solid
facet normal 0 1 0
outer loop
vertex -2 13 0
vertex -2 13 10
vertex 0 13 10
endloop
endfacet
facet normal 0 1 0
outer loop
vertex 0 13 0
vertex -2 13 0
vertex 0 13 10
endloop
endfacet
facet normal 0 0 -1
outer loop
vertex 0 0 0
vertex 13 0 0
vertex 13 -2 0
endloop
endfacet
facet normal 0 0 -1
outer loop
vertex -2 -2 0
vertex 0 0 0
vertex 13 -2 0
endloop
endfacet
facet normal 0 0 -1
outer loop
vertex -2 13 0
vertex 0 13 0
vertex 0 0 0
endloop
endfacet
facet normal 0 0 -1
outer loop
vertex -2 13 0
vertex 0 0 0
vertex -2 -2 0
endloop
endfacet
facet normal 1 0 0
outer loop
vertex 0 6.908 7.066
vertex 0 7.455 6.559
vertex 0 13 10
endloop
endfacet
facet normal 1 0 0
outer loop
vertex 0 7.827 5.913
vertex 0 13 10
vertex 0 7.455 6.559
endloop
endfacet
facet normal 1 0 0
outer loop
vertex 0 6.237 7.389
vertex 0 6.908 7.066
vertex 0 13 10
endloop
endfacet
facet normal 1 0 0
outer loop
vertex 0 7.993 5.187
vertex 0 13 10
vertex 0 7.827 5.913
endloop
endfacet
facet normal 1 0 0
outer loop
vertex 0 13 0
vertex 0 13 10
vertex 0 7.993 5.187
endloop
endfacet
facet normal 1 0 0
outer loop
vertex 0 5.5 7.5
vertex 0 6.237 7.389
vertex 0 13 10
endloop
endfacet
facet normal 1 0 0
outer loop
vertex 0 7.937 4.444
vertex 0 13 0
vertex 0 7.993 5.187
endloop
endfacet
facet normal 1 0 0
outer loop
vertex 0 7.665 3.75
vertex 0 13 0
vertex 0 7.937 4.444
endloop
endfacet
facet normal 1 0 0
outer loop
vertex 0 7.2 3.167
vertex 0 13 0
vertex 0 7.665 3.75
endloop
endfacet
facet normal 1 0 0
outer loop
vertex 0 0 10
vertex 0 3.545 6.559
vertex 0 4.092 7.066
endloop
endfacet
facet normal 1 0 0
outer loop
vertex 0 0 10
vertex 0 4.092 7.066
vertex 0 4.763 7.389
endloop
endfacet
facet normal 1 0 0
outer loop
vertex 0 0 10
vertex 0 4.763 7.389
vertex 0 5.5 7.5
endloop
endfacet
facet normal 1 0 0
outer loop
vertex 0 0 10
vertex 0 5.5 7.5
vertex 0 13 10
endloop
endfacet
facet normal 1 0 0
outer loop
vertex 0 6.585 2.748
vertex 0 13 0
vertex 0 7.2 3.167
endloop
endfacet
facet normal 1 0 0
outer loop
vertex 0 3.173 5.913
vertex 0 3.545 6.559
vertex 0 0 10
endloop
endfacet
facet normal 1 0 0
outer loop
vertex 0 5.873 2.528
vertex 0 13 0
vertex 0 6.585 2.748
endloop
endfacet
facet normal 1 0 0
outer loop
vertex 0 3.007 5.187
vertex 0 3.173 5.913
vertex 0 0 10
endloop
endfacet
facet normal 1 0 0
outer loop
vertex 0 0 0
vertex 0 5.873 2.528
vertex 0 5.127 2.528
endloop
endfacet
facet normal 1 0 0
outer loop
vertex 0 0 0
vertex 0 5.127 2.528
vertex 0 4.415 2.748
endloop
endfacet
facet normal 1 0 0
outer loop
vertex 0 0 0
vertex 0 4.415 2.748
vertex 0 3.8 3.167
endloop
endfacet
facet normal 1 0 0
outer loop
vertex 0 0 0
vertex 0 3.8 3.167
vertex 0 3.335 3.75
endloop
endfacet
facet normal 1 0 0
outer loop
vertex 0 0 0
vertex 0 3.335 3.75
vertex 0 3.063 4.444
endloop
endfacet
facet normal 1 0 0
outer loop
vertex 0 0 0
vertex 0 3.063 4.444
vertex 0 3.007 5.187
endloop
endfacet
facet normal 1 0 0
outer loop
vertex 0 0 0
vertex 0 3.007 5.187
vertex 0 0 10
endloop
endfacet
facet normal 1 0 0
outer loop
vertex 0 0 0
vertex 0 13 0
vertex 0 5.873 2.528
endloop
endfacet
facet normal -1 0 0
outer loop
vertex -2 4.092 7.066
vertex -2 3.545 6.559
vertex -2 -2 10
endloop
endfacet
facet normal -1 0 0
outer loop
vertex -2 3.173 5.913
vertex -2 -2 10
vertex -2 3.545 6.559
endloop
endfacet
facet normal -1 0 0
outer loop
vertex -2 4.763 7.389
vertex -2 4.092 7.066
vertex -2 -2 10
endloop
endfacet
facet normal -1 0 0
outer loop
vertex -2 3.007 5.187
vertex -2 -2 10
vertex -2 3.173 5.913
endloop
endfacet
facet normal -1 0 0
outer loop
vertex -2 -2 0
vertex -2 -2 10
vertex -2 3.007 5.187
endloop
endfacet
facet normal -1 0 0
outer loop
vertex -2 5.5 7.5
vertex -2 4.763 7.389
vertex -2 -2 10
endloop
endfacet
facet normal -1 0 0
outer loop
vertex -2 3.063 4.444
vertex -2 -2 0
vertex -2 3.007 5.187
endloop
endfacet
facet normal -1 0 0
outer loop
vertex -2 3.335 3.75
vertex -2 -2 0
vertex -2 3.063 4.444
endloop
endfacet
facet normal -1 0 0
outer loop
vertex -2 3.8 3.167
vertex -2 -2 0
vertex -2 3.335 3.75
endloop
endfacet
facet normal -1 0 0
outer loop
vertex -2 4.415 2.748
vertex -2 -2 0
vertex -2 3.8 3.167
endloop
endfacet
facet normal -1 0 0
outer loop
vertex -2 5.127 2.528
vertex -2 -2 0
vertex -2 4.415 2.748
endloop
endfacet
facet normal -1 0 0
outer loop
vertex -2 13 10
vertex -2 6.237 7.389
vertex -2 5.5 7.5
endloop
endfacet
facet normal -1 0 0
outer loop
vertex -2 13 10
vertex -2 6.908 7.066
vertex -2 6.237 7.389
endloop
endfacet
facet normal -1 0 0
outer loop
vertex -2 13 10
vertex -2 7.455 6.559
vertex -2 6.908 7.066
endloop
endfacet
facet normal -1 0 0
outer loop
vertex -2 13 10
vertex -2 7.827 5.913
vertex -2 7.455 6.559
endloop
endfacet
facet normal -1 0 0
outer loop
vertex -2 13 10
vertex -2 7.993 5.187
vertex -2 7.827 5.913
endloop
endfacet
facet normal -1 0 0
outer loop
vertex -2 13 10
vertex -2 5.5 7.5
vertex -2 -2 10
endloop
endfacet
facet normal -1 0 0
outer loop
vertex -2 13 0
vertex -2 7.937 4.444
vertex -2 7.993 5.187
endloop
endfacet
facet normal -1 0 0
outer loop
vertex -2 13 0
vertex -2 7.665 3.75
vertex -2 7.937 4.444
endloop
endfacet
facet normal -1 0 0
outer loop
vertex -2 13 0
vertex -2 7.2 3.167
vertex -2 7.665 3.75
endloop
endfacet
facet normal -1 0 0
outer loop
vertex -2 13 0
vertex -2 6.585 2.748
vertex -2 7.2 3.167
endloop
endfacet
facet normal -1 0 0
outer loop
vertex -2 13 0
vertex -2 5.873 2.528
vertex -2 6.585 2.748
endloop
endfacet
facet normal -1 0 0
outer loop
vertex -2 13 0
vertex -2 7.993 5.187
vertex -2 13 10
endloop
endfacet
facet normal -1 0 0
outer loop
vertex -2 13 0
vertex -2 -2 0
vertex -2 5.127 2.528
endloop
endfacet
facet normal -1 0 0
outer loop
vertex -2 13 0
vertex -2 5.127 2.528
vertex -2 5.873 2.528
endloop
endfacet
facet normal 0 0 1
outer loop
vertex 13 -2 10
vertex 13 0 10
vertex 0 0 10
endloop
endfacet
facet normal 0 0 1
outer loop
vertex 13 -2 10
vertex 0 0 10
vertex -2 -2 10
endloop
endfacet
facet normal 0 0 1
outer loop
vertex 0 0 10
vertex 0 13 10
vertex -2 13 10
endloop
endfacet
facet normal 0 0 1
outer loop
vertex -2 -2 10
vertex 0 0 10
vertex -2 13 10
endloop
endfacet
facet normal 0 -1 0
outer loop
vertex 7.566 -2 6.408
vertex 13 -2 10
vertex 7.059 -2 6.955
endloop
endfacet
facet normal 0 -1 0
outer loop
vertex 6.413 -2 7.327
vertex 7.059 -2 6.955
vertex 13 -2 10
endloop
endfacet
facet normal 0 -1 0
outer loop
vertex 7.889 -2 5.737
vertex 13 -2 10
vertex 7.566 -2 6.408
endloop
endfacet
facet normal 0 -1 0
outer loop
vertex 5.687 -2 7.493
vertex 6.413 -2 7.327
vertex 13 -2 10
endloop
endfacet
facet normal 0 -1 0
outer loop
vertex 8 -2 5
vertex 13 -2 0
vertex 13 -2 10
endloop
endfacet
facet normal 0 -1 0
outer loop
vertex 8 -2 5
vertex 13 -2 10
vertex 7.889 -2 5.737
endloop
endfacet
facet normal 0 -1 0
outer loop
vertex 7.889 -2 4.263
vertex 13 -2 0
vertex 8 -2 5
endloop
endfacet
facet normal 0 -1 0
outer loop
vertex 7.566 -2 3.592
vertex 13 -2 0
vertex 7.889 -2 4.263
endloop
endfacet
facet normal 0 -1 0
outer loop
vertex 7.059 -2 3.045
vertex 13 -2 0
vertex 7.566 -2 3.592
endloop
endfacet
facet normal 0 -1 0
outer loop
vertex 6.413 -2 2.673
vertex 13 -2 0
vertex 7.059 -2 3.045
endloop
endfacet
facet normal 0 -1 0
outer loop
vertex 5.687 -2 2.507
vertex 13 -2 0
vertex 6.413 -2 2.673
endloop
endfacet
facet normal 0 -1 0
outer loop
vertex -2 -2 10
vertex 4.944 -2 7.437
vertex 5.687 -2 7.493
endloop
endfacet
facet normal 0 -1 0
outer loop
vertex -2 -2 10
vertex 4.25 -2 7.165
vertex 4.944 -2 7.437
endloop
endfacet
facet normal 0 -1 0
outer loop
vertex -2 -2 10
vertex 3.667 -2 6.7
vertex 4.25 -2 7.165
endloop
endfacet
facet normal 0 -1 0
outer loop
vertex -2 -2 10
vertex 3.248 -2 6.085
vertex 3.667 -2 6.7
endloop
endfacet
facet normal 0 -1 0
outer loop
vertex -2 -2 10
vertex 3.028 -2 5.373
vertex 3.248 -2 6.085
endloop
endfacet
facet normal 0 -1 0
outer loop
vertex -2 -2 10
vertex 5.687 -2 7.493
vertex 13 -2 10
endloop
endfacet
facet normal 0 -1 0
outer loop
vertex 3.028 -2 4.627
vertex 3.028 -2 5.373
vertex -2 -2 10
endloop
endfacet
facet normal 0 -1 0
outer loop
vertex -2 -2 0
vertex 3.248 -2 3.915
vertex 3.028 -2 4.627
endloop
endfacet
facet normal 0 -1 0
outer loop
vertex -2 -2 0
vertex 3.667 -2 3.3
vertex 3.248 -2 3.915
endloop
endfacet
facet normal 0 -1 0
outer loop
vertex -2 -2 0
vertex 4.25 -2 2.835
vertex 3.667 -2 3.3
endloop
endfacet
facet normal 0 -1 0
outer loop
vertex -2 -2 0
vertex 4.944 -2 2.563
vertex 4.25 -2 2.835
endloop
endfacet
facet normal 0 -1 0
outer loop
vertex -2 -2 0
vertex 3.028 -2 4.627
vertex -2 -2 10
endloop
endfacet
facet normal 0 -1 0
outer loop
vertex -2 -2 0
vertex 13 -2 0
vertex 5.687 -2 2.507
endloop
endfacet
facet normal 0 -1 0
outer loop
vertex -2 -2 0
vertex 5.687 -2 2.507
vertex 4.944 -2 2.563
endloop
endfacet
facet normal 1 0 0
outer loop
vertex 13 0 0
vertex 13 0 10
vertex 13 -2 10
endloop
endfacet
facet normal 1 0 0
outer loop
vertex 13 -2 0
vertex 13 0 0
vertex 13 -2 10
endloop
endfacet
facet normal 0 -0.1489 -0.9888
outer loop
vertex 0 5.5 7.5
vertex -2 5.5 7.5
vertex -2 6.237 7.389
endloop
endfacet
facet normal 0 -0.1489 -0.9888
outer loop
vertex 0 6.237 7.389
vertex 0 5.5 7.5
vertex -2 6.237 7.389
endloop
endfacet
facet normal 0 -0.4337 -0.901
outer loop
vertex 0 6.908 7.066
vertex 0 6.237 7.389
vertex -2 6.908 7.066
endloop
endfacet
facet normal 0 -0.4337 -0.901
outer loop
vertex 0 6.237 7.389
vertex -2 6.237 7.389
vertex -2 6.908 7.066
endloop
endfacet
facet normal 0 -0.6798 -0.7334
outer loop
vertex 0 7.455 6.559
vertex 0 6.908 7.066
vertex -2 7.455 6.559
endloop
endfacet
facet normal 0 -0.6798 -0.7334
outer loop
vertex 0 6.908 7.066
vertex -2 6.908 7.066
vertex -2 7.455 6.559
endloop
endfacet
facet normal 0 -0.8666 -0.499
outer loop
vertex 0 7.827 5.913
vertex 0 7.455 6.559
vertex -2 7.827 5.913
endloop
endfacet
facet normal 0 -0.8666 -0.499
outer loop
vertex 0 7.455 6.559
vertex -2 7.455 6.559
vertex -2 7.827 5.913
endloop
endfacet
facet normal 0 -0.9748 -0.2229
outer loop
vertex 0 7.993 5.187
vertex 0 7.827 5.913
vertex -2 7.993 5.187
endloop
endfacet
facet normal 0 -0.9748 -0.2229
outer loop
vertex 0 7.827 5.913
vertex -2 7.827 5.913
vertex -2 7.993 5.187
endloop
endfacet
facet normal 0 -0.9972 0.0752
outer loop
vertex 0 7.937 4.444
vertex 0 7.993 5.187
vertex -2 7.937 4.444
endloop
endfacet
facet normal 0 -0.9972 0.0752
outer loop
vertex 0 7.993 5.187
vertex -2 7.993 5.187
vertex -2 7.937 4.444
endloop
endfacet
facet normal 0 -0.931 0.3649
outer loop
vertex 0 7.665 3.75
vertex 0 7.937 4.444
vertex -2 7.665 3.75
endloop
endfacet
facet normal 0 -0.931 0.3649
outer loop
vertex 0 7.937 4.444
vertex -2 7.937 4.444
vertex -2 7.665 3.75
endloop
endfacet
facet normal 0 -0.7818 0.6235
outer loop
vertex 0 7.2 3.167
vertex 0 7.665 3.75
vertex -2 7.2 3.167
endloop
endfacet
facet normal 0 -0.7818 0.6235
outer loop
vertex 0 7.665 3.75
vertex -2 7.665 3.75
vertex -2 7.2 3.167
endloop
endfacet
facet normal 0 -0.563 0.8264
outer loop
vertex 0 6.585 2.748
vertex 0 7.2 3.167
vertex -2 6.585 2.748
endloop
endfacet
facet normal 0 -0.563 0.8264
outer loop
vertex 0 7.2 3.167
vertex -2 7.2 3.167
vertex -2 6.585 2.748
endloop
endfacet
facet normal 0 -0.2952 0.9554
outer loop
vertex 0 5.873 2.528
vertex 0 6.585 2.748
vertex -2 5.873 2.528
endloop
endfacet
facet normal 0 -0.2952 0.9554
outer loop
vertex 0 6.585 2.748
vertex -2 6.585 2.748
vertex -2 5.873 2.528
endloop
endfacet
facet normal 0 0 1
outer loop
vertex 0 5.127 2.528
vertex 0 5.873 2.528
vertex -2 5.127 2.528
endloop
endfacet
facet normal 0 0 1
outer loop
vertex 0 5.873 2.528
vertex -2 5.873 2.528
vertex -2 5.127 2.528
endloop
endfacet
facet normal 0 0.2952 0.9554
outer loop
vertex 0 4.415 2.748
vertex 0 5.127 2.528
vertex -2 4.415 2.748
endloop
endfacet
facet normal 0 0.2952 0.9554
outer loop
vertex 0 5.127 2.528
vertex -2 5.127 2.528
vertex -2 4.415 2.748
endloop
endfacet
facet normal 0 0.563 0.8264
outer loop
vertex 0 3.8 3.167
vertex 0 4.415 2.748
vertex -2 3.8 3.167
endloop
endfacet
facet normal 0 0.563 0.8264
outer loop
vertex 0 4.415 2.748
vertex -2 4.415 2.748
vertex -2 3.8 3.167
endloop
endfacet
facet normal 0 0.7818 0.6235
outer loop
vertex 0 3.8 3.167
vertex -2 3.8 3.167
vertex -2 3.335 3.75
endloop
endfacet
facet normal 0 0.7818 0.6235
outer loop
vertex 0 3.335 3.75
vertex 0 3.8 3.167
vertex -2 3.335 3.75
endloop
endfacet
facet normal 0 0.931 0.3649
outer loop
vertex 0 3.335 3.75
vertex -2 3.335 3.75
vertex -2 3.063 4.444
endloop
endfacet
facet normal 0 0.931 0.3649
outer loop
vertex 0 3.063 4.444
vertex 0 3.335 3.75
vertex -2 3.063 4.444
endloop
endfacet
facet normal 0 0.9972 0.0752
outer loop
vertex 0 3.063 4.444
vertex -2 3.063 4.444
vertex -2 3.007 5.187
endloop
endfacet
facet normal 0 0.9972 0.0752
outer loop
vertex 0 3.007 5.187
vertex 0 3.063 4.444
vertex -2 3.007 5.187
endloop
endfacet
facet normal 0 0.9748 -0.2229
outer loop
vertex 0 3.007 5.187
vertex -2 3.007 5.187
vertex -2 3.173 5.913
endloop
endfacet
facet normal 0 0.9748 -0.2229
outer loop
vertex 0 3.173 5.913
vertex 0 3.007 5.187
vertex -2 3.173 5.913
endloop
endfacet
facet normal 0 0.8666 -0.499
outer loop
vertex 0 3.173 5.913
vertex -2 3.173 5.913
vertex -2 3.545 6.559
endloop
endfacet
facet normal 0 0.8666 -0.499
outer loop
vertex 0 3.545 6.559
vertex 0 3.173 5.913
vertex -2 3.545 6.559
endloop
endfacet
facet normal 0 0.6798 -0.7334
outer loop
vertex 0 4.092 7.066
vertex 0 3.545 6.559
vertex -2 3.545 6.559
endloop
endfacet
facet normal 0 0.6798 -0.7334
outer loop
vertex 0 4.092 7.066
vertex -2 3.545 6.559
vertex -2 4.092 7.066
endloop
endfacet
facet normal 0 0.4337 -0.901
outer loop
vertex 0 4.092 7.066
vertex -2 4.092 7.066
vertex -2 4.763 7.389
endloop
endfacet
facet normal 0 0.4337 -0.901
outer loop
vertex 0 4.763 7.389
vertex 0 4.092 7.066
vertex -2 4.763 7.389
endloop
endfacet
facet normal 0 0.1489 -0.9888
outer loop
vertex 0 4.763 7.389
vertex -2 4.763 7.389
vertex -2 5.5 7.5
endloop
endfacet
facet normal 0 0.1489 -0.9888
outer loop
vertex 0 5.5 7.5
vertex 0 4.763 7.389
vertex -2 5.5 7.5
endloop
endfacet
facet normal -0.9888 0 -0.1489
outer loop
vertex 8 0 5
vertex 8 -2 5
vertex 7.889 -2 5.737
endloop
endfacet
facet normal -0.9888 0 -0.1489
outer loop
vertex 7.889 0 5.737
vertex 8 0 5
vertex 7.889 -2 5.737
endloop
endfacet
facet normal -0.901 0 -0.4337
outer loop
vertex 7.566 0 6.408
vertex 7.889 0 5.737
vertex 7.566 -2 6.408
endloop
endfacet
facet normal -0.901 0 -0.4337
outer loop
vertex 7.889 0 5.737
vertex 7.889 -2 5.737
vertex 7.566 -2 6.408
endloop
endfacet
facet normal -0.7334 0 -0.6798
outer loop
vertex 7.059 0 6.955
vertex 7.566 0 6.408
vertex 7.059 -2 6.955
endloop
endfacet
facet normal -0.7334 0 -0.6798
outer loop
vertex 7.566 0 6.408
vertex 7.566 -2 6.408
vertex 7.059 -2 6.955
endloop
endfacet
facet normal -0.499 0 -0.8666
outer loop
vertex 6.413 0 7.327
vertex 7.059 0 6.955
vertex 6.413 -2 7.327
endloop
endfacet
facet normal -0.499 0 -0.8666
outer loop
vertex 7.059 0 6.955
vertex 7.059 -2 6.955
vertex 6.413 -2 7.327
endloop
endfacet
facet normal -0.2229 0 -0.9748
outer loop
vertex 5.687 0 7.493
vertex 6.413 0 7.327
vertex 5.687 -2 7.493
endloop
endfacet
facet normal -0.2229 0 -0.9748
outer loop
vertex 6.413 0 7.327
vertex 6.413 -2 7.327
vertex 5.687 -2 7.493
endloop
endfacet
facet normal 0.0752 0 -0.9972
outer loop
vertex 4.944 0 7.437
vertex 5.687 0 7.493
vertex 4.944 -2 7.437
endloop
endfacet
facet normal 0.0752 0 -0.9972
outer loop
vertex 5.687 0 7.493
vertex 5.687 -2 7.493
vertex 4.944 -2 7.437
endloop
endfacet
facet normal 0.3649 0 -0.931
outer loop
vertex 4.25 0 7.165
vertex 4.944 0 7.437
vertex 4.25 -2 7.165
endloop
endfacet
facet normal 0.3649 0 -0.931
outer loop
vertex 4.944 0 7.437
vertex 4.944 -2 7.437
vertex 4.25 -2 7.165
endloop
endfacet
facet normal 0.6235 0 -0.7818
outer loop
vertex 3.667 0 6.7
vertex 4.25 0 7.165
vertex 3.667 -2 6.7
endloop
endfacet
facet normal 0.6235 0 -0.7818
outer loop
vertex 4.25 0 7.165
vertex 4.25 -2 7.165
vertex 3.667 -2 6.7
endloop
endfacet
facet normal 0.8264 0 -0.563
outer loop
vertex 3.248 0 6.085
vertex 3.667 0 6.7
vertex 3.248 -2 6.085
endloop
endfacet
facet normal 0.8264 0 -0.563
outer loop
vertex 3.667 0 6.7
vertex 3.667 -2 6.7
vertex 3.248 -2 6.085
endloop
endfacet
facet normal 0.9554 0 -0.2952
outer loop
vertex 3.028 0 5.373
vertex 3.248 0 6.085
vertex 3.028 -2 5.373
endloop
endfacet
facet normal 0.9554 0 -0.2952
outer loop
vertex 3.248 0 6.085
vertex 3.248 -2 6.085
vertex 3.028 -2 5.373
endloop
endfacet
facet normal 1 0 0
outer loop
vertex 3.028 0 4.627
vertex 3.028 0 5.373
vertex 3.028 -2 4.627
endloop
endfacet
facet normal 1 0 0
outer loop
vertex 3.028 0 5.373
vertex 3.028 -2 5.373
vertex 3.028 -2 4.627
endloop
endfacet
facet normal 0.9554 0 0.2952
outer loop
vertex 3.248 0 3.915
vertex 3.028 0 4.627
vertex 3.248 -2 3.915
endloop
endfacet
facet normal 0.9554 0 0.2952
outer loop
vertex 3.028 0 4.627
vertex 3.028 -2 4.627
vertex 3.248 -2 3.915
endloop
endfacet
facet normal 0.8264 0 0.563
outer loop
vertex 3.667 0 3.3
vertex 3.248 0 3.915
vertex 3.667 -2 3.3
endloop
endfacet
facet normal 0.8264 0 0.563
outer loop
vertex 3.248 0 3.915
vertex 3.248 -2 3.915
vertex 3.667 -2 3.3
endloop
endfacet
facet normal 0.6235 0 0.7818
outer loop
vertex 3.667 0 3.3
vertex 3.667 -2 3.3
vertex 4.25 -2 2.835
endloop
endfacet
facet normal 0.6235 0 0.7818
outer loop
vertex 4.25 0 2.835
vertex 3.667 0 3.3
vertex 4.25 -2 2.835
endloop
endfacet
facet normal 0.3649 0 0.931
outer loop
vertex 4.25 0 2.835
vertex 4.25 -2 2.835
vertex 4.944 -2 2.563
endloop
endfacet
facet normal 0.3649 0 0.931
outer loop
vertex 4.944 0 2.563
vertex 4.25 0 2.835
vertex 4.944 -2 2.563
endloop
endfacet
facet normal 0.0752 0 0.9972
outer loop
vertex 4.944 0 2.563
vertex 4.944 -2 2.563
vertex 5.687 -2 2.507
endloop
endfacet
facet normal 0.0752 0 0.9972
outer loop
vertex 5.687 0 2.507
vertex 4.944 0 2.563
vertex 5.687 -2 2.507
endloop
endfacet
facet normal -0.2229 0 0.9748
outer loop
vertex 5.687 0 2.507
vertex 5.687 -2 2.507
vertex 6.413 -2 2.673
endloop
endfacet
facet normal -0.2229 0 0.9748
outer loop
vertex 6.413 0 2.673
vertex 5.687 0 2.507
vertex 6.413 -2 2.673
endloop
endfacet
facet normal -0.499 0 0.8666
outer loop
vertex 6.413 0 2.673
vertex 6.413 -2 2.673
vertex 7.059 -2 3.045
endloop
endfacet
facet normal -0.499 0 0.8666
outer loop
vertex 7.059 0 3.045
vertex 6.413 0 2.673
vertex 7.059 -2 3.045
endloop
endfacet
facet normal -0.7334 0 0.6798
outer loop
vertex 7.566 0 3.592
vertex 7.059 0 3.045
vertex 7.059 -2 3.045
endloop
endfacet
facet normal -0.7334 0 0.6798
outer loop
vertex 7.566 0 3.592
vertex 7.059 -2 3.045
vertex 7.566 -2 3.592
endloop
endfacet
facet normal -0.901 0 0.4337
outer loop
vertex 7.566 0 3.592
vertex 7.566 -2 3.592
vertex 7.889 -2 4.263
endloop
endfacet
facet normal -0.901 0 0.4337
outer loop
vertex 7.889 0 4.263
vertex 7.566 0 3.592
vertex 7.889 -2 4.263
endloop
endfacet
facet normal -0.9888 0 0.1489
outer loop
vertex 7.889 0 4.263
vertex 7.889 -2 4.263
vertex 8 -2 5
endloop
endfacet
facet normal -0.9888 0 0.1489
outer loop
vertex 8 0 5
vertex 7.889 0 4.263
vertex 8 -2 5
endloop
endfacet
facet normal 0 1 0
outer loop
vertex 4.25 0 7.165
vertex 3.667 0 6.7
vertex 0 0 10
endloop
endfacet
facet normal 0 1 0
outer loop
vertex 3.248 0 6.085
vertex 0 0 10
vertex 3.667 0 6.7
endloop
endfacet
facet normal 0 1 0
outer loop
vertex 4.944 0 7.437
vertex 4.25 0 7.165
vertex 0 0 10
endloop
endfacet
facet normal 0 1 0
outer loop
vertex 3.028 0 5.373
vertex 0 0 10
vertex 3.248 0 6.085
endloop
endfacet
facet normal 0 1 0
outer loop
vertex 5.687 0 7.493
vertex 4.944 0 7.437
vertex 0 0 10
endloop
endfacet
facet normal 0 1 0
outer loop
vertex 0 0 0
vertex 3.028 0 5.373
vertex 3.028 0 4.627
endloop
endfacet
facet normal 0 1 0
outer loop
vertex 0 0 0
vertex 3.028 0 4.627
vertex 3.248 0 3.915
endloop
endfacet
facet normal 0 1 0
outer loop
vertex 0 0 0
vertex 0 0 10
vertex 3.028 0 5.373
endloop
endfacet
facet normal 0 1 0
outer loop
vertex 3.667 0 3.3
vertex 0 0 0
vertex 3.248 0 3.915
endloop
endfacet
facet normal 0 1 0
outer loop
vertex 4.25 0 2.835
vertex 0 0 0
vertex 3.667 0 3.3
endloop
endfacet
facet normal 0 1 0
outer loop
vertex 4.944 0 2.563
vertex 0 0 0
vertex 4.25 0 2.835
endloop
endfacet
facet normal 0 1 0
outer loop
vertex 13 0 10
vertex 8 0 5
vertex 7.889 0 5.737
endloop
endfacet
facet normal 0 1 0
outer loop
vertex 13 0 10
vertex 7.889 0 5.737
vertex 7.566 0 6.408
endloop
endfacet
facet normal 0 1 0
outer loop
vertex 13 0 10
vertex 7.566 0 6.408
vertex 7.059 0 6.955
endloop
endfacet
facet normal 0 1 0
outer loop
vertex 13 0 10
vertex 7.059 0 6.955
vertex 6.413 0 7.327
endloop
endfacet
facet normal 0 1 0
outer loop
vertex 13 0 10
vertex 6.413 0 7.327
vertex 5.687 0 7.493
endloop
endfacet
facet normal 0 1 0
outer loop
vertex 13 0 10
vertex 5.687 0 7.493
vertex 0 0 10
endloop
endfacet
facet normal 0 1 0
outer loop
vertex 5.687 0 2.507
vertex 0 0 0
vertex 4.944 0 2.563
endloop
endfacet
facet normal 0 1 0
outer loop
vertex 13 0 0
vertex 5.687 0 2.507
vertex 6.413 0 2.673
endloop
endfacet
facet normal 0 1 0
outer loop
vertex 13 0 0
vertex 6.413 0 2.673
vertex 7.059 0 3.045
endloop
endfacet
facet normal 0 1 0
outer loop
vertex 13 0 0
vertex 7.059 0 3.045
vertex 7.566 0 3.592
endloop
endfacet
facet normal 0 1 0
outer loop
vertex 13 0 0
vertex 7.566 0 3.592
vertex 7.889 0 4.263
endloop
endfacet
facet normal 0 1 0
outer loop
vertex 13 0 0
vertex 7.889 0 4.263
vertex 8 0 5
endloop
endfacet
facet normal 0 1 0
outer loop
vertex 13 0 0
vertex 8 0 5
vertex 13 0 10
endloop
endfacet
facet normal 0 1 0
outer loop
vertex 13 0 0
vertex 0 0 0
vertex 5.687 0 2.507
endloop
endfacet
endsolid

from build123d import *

# Parameters (mm, degrees)
EXTRUDE_1_DEPTH     = 10
SKETCH_2_R          = 2.5
CUT_EXTRUDE_1_DEPTH = 10
SKETCH_3_R          = 2.5
CUT_EXTRUDE_2_DEPTH = 10


with BuildPart() as part:
    # 草图1 → 凸台-拉伸1 (new body)
    with BuildSketch(Plane.XY):
        Polygon((0, 0), (13, 0), (13, -2), (-2, -2), (-2, 13), (0, 13), align=None)
    extrude(amount=EXTRUDE_1_DEPTH)

    # 草图2 → 切除-拉伸1 (cut)
    with BuildSketch(Plane.XZ.offset(2)):
        with Locations((5.5, 5)):
            Circle(SKETCH_2_R)
    extrude(amount=-CUT_EXTRUDE_1_DEPTH, mode=Mode.SUBTRACT)

    # 草图3 → 切除-拉伸2 (cut)
    with BuildSketch(Plane.ZY.offset(2)):
        with Locations((5, 5.5)):
            Circle(SKETCH_3_R)
    extrude(amount=-CUT_EXTRUDE_2_DEPTH, mode=Mode.SUBTRACT)


solid = part.part
